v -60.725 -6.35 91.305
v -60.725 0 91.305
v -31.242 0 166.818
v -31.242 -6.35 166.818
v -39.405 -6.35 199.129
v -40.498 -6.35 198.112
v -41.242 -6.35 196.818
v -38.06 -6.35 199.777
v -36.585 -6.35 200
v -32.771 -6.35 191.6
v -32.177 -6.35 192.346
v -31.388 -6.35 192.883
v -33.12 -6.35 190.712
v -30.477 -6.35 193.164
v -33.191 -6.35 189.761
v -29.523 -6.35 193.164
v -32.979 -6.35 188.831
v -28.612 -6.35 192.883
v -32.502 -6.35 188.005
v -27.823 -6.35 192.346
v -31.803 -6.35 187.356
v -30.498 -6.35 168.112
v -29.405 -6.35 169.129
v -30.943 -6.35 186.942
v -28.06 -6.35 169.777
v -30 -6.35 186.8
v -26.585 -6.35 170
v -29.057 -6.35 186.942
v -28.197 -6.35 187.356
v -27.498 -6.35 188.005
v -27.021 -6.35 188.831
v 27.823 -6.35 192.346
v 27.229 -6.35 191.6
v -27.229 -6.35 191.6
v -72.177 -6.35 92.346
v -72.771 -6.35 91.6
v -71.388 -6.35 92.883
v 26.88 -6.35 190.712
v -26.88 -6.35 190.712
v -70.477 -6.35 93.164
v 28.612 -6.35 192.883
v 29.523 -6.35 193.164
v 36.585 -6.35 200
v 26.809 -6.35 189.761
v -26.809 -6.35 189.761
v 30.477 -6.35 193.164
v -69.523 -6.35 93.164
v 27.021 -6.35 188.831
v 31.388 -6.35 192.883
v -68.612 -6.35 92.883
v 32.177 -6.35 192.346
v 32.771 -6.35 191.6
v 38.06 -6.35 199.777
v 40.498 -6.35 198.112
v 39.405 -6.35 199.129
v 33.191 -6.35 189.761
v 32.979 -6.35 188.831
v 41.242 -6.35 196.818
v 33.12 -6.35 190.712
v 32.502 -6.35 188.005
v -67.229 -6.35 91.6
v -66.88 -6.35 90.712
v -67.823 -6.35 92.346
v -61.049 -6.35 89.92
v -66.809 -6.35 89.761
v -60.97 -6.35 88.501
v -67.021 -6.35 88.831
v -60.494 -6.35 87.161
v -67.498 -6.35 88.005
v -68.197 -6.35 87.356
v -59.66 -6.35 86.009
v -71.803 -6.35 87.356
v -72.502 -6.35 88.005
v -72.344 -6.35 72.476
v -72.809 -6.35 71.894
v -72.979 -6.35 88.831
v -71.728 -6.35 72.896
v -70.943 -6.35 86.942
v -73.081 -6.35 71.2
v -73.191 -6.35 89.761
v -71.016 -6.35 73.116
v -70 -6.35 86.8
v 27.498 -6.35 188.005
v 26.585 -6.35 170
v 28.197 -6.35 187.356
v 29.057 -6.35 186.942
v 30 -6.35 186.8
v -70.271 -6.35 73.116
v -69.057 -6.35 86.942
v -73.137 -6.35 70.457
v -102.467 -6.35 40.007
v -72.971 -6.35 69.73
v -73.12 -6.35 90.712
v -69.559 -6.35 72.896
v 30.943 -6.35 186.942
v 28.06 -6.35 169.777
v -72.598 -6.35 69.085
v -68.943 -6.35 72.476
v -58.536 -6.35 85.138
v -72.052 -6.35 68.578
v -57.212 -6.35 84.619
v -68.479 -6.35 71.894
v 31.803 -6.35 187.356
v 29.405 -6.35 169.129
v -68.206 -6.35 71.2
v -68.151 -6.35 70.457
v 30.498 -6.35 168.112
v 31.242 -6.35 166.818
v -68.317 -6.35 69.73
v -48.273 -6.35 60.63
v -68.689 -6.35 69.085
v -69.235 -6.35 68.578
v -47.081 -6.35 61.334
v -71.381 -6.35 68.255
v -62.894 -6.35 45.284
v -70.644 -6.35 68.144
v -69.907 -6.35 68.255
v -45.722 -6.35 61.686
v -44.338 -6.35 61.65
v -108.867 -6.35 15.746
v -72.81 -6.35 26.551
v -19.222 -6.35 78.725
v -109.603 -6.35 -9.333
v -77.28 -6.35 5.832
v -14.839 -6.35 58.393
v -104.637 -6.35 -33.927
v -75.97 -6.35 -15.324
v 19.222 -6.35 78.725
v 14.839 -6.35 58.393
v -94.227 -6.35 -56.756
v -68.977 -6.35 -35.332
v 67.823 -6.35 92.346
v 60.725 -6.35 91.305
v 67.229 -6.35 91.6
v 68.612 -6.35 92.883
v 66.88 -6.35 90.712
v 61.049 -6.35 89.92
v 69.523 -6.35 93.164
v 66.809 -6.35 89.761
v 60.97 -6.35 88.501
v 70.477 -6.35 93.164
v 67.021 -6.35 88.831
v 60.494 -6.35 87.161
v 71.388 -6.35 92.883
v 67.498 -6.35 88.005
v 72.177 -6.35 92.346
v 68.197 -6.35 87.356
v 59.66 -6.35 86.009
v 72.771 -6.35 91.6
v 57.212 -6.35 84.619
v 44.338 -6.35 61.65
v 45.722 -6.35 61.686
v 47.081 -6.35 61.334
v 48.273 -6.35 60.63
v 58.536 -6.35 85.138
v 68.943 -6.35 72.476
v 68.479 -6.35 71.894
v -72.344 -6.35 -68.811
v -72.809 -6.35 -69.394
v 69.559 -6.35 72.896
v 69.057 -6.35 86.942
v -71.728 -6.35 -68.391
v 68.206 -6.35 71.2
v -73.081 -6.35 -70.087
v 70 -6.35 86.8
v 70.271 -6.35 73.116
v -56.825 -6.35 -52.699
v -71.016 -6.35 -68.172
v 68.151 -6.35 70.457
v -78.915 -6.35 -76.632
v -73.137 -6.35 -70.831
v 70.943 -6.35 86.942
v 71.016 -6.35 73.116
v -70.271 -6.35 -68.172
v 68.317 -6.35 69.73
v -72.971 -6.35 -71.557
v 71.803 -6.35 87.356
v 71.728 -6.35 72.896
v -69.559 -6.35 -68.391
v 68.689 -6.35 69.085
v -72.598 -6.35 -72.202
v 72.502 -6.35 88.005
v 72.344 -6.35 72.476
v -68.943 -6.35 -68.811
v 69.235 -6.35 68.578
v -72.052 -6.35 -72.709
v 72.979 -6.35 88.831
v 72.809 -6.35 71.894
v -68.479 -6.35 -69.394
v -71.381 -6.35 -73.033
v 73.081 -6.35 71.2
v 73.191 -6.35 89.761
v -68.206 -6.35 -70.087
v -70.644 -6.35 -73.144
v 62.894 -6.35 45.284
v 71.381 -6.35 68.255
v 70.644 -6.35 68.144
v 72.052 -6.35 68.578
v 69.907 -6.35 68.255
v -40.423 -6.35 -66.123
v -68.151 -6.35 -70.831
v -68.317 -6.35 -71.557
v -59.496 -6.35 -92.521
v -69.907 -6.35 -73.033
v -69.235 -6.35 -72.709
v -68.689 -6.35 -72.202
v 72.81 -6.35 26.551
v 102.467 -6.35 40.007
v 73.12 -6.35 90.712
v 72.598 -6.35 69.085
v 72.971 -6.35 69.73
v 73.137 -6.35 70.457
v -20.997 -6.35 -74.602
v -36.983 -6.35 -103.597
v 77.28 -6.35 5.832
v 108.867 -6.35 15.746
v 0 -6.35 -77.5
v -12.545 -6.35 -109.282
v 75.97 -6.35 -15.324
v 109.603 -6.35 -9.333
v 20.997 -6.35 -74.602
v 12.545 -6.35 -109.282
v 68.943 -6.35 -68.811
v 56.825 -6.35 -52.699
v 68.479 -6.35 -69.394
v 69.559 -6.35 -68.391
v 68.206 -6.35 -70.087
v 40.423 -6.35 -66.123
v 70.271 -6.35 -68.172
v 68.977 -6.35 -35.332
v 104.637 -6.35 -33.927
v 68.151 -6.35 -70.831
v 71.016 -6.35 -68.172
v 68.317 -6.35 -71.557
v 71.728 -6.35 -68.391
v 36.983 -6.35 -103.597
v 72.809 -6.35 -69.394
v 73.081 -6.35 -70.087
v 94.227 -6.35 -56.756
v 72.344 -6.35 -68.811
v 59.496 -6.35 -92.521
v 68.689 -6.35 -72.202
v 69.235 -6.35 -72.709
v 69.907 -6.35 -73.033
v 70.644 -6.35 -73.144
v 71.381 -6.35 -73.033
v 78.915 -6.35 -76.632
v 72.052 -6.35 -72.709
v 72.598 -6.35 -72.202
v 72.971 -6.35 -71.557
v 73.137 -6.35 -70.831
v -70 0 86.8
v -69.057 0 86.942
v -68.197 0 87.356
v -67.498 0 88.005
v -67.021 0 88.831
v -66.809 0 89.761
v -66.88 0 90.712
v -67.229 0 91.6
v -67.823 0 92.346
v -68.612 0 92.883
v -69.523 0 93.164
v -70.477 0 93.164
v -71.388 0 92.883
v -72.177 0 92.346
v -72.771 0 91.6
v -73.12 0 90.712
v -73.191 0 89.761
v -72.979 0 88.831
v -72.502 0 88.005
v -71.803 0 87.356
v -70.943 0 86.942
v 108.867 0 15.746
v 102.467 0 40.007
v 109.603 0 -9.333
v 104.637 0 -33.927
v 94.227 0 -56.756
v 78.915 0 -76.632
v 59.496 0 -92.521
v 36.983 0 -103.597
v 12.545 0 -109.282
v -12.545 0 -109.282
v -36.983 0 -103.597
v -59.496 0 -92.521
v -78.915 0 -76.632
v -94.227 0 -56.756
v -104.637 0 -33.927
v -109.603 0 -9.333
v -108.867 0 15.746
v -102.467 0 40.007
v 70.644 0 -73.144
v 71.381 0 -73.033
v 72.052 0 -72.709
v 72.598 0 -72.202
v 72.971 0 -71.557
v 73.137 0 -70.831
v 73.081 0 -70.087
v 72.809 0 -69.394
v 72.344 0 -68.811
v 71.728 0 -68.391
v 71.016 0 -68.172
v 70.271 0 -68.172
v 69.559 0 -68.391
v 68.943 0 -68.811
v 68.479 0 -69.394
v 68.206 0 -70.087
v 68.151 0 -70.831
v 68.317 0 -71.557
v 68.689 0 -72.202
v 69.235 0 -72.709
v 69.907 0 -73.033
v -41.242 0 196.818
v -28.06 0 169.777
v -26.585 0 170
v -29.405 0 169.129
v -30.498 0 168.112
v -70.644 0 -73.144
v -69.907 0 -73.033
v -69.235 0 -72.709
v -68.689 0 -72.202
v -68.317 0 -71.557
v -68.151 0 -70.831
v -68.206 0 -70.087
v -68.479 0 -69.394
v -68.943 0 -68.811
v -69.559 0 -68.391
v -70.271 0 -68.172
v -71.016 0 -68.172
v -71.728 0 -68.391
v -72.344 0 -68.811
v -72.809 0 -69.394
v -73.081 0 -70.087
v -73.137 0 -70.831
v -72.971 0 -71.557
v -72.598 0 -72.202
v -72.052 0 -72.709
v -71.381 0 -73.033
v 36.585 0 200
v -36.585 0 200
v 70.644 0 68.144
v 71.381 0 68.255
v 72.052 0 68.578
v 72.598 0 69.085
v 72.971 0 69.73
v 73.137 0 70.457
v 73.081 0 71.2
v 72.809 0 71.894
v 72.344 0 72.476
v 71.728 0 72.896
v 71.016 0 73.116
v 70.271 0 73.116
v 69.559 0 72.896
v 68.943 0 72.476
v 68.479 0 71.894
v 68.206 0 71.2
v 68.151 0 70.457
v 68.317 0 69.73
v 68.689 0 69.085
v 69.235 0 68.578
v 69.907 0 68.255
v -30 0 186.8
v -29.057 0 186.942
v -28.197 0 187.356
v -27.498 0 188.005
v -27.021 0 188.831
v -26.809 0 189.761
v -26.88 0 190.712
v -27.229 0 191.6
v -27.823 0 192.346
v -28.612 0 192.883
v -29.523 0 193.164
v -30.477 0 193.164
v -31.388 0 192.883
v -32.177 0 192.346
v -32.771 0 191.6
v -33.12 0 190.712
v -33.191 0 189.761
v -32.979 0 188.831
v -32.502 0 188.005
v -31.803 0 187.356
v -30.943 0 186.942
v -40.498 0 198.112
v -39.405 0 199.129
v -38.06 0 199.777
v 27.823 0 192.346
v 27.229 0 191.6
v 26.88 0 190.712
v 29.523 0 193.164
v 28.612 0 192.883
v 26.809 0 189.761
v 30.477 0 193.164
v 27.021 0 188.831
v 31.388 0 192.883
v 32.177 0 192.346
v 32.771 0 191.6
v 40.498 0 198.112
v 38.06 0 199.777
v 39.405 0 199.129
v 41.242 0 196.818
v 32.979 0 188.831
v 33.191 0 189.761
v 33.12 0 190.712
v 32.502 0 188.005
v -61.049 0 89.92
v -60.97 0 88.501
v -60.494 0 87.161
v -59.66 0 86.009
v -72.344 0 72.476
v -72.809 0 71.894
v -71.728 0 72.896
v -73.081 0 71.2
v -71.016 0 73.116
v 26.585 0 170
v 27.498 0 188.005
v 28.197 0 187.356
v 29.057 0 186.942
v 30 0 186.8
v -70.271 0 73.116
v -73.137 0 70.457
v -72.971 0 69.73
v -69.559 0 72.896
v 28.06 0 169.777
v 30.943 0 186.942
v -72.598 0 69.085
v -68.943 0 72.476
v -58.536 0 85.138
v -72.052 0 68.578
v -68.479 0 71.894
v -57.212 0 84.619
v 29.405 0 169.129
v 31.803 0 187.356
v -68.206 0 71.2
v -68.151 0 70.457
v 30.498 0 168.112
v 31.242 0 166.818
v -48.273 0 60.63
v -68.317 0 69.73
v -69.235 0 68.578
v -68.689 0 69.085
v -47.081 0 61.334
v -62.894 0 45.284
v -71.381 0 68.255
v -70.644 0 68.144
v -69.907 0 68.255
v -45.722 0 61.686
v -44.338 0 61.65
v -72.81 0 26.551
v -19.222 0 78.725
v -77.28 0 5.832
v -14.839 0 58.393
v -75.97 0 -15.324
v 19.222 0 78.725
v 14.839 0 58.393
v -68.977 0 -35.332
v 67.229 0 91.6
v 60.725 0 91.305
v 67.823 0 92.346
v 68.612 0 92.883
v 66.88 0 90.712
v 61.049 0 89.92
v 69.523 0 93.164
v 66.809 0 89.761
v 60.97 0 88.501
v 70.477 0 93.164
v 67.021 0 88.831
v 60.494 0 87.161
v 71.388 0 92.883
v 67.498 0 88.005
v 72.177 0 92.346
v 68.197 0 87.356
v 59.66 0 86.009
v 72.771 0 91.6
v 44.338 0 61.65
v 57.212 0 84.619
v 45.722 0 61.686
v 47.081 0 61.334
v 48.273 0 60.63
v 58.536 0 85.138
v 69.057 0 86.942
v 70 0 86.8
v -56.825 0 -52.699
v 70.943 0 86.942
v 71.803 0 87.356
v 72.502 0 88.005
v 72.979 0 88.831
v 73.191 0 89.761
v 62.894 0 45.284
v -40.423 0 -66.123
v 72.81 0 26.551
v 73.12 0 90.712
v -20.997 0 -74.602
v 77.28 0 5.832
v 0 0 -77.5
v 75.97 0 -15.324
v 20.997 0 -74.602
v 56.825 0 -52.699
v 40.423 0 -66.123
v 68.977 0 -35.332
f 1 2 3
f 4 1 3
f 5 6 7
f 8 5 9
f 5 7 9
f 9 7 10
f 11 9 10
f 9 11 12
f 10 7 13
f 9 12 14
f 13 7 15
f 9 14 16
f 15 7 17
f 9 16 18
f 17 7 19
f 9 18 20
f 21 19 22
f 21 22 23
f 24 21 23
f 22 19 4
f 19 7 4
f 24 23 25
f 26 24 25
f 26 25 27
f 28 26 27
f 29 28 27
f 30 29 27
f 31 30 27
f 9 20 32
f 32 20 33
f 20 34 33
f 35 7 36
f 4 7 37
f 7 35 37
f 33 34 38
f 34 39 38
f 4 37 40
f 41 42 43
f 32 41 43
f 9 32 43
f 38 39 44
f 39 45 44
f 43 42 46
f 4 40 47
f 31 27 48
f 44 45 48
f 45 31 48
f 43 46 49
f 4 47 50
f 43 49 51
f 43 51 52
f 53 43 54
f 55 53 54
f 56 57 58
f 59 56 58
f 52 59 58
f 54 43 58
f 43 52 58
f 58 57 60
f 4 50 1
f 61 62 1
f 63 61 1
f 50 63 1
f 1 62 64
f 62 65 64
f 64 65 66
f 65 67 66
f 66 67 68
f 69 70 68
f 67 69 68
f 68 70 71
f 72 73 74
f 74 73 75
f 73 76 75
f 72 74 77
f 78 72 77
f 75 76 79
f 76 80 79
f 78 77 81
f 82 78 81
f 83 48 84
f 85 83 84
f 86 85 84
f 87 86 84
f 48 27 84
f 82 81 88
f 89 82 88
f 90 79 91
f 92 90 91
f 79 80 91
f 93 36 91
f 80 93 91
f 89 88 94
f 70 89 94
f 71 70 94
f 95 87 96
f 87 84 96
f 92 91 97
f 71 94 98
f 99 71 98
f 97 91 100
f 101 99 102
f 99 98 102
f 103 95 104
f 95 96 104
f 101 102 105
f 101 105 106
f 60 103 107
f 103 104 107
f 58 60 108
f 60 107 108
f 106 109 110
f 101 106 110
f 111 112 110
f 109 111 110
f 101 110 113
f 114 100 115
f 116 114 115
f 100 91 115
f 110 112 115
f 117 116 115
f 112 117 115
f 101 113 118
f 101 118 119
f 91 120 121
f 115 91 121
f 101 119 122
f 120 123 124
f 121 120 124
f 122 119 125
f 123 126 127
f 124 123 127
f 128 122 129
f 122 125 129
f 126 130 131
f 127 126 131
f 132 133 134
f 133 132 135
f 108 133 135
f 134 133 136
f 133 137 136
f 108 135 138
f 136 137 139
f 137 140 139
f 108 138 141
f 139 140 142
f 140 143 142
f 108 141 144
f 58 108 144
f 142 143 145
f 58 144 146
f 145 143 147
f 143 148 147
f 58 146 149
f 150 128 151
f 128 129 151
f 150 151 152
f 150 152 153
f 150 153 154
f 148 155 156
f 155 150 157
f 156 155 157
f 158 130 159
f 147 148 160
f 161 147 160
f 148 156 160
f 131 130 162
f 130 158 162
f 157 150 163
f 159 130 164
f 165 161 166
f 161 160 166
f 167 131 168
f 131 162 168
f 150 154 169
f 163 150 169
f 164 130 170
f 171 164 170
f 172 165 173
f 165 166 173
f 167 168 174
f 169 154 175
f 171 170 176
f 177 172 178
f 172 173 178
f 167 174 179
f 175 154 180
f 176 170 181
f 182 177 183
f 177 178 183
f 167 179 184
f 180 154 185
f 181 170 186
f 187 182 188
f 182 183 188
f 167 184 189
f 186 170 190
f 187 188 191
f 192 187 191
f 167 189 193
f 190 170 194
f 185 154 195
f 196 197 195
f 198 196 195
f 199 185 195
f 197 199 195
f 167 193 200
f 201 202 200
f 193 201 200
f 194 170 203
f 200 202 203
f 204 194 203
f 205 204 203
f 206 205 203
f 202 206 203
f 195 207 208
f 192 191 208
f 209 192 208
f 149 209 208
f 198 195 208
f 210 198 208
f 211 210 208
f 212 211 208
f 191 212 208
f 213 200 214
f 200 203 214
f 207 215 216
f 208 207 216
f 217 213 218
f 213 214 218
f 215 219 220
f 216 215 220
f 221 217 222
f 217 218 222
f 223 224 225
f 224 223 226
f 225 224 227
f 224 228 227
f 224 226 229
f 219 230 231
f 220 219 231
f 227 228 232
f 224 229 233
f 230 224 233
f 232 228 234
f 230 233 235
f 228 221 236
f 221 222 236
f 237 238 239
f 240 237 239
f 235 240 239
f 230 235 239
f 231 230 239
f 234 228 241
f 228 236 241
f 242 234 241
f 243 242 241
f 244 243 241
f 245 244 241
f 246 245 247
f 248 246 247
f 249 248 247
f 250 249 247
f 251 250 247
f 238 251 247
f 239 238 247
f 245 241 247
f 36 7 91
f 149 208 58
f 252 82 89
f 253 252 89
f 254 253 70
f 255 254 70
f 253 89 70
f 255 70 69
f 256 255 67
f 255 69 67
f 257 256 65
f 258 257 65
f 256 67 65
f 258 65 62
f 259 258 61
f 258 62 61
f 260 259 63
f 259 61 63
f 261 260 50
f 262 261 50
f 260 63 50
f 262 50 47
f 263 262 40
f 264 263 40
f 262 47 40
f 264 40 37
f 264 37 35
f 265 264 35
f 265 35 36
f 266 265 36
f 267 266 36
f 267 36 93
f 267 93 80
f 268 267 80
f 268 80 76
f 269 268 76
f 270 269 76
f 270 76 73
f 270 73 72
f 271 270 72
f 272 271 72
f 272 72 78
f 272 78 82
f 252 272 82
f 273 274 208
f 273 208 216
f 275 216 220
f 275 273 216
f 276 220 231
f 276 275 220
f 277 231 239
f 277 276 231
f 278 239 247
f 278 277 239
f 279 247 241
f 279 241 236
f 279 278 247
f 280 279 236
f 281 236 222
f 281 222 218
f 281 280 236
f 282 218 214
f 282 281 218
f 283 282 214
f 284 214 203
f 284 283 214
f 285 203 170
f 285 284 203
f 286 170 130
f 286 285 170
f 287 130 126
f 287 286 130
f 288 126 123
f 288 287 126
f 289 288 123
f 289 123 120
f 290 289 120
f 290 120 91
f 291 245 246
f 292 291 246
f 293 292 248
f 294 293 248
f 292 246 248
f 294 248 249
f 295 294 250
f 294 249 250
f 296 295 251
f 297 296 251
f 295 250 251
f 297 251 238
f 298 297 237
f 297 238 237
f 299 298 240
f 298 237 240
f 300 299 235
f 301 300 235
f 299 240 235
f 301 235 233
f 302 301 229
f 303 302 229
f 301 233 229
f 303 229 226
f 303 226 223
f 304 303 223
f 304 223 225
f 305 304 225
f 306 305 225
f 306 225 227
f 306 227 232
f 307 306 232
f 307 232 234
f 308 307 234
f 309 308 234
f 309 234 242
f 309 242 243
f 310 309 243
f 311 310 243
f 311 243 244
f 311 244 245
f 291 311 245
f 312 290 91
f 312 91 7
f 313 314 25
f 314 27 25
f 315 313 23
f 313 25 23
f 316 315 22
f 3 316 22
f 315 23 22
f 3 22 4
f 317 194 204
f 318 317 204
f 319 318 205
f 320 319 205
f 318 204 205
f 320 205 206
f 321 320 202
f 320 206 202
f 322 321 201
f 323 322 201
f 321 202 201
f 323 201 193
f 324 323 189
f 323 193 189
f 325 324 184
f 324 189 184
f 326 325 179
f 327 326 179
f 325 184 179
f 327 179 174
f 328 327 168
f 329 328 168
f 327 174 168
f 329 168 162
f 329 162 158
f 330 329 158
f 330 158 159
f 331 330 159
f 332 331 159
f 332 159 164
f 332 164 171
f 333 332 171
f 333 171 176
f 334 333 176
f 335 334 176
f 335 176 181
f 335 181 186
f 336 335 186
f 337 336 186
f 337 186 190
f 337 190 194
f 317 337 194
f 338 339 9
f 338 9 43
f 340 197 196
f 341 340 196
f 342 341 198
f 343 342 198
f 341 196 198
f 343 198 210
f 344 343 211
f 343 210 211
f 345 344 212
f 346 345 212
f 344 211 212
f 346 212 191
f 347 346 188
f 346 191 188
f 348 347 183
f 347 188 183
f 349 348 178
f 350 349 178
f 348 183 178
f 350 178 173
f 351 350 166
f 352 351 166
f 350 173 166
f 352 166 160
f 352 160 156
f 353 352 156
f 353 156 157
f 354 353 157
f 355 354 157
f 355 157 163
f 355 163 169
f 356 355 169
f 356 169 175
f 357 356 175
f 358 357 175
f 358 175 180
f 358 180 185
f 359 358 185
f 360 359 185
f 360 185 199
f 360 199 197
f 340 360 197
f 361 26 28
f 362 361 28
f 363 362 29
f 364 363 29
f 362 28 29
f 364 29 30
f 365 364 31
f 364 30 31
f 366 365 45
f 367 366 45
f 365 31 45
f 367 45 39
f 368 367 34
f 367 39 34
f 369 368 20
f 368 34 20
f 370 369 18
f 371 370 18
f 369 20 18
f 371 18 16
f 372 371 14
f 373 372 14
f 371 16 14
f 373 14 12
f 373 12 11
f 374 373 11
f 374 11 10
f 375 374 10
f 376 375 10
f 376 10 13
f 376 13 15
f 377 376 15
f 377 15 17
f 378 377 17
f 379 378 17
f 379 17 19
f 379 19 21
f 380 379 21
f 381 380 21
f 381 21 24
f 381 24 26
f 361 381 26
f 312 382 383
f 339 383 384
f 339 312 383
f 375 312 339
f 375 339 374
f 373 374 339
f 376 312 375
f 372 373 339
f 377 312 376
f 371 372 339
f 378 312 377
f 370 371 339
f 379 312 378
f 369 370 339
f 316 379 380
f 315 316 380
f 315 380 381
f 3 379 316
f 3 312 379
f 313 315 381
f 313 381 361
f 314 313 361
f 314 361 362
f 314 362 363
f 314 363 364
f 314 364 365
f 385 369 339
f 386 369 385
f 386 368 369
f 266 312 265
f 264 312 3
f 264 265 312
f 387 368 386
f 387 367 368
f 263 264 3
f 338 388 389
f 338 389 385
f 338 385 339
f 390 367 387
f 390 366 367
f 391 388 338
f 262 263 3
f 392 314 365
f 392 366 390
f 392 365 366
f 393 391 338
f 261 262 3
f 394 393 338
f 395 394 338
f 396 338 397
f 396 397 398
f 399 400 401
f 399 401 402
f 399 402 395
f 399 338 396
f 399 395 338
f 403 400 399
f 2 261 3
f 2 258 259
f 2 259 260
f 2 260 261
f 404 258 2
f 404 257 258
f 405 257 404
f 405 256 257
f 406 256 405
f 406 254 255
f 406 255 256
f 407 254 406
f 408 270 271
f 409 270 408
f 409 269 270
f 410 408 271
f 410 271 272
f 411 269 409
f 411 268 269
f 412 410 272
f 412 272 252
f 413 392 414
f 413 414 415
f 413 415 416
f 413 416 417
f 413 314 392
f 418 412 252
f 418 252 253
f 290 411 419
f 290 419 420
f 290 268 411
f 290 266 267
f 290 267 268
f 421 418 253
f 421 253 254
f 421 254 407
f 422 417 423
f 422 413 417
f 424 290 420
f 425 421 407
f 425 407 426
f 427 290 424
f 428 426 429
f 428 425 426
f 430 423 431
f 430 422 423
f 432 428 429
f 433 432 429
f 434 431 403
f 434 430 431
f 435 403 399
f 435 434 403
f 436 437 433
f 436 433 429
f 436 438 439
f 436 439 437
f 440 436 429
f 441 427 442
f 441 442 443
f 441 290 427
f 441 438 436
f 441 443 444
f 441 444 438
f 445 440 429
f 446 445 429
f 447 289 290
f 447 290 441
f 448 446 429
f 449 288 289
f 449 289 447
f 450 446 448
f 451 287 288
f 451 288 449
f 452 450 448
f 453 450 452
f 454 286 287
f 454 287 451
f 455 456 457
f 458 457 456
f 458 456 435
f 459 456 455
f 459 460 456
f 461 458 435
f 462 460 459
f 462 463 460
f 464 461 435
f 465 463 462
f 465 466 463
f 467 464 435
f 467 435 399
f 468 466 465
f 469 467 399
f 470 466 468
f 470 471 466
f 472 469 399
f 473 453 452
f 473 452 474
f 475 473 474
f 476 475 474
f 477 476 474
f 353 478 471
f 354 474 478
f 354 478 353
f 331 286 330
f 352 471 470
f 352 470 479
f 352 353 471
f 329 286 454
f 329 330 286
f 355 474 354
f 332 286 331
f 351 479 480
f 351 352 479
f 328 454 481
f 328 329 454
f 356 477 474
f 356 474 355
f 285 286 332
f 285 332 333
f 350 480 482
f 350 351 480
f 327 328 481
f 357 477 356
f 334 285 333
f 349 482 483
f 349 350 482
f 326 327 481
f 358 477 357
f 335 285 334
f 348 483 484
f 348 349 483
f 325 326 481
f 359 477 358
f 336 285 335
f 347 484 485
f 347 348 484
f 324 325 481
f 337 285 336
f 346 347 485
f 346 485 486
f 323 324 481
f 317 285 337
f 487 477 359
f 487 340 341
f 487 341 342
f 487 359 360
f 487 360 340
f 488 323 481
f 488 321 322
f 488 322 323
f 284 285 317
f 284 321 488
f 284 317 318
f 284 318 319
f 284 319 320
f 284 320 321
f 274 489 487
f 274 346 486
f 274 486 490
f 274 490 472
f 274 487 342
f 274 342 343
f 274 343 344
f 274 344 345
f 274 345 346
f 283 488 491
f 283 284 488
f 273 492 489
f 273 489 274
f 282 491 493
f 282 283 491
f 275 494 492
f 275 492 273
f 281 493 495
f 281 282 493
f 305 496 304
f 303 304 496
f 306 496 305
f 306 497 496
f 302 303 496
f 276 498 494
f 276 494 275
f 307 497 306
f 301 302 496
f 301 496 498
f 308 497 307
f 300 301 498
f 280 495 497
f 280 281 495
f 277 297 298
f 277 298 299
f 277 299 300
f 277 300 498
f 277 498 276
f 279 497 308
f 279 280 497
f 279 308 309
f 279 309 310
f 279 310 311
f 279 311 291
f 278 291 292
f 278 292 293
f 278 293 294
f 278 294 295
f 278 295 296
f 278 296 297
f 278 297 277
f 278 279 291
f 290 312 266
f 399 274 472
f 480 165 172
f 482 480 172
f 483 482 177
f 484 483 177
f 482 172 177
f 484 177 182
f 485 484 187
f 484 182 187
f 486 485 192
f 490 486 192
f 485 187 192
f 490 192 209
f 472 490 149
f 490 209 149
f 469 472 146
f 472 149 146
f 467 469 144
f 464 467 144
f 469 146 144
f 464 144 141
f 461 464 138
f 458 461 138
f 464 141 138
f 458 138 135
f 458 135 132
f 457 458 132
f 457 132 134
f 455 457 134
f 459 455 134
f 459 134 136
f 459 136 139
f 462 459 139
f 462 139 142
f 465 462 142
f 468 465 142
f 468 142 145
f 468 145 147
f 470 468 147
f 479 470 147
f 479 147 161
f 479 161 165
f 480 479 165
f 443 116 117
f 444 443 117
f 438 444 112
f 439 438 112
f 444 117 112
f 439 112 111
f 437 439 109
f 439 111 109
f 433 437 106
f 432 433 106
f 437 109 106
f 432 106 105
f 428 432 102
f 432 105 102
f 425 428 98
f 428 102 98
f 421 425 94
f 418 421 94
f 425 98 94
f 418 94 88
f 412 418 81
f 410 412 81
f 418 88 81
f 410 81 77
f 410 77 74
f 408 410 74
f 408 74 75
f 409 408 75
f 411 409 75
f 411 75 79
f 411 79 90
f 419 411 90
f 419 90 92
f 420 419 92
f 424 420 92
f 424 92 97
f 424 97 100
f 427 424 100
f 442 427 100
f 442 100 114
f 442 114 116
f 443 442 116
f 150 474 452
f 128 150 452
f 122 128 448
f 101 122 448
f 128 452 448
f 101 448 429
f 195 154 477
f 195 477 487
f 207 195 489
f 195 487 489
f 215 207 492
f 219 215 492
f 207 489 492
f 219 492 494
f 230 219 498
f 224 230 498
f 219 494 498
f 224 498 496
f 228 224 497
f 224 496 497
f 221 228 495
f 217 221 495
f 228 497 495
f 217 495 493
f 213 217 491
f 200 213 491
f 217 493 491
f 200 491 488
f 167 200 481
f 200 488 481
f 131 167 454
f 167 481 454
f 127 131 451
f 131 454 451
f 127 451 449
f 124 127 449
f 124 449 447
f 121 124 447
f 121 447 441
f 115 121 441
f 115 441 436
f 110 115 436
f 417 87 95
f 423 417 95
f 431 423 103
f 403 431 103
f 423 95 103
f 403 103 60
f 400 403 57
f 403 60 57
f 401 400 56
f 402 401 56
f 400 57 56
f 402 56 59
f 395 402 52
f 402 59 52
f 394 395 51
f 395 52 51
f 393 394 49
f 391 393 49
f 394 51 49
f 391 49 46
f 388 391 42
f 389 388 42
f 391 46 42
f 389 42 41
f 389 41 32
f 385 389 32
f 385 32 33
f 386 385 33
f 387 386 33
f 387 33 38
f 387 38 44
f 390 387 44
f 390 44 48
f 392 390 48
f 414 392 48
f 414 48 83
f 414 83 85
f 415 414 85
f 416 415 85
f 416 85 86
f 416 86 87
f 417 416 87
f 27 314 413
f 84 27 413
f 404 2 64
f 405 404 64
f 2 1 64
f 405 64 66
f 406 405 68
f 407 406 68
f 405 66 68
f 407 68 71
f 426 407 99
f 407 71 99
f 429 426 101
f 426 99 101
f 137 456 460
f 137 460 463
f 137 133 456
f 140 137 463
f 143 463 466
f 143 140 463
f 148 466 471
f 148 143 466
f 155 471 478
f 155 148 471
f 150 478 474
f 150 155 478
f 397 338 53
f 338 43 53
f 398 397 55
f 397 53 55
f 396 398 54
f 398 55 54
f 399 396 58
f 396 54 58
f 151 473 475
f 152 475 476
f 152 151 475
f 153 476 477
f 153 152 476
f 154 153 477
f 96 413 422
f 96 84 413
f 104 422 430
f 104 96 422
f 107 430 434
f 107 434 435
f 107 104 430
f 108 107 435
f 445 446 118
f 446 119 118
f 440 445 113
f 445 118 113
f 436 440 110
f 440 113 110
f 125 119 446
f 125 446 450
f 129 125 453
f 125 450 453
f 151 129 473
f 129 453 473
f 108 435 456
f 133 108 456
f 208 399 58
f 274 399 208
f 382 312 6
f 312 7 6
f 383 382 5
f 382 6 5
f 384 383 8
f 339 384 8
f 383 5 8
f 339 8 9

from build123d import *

# Parameters (mm, degrees)
BOSS_EXTRUDE1_DEPTH         = 6.35
M6_CLEARANCE_HOLE1_D        = 6.4
TAP_DRILL_FOR_M6X1_0_TAP1_D = 5
FILLET1_R                   = 5
FILLET2_R                   = 5


with BuildPart() as part:
    # Sketch1 → Boss-Extrude1 (new body)
    with BuildSketch(Plane(origin=(0, 0, 0), x_dir=(1, 0, 0), z_dir=(0, 1, 0))):
        with BuildLine():
            Line((-102.466925197, -40.006614961), (-40, -200))
            Line((-40, -200), (40, -200))
            Line((40, -200), (102.466925197, -40.006614961))
            ThreePointArc((102.466925197, -40.006614961), (0, 110), (-102.466925197, -40.006614961))
        make_face()
        with BuildLine():
            Line((-30, -170), (30, -170))
            Line((30, -170), (62.79649165, -86))
            ThreePointArc((62.79649165, -86), (0, -77.984711576), (-62.79649165, -86))
            Line((-62.79649165, -86), (-30, -170))
        make_face(mode=Mode.SUBTRACT)
        with BuildLine():
            ThreePointArc((-46.479429348, -62.015422658), (0, -57.984711576), (46.479429348, -62.015422658))
            ThreePointArc((46.479429348, -62.015422658), (0, 77.5), (-46.479429348, -62.015422658))
        make_face(mode=Mode.SUBTRACT)
    extrude(amount=-BOSS_EXTRUDE1_DEPTH)

    # M6 Clearance Hole1 (through all)
    with Locations(Plane(origin=(-70, 0, 90), x_dir=(0, 0, 1), z_dir=(0, 1, 0))):
        with Locations((0, 0), (100, 40), (100, 100), (0, 140)):
            Hole(M6_CLEARANCE_HOLE1_D / 2)

    # Tap Drill for M6x1.0 Tap1 (through all)
    with Locations(Plane(origin=(-70.64375, 0, 70.64375), x_dir=(0, 0, 1), z_dir=(0, 1, 0))):
        with Locations((0, 0), (-141.2875, 0), (-141.2875, 141.2875), (0, 141.2875)):
            Hole(TAP_DRILL_FOR_M6X1_0_TAP1_D / 2)

    # Fillet1
    fillet1_edges = [part.edges().sort_by_distance(p)[0] for p in [
        (-46.479429348, -3.175, 62.015422658),
        (46.479429348, -3.175, 62.015422658),
        (-30, -3.175, 170),
        (-62.79649165, -3.175, 86),
        (62.79649165, -3.175, 86),
        (30, -3.175, 170),
    ]]
    fillet(fillet1_edges, radius=FILLET1_R)

    # Fillet2
    fillet2_edges = [part.edges().sort_by_distance(p)[0] for p in [
        (40, -3.175, 200),
        (-40, -3.175, 200),
    ]]
    fillet(fillet2_edges, radius=FILLET2_R)


solid = part.part
